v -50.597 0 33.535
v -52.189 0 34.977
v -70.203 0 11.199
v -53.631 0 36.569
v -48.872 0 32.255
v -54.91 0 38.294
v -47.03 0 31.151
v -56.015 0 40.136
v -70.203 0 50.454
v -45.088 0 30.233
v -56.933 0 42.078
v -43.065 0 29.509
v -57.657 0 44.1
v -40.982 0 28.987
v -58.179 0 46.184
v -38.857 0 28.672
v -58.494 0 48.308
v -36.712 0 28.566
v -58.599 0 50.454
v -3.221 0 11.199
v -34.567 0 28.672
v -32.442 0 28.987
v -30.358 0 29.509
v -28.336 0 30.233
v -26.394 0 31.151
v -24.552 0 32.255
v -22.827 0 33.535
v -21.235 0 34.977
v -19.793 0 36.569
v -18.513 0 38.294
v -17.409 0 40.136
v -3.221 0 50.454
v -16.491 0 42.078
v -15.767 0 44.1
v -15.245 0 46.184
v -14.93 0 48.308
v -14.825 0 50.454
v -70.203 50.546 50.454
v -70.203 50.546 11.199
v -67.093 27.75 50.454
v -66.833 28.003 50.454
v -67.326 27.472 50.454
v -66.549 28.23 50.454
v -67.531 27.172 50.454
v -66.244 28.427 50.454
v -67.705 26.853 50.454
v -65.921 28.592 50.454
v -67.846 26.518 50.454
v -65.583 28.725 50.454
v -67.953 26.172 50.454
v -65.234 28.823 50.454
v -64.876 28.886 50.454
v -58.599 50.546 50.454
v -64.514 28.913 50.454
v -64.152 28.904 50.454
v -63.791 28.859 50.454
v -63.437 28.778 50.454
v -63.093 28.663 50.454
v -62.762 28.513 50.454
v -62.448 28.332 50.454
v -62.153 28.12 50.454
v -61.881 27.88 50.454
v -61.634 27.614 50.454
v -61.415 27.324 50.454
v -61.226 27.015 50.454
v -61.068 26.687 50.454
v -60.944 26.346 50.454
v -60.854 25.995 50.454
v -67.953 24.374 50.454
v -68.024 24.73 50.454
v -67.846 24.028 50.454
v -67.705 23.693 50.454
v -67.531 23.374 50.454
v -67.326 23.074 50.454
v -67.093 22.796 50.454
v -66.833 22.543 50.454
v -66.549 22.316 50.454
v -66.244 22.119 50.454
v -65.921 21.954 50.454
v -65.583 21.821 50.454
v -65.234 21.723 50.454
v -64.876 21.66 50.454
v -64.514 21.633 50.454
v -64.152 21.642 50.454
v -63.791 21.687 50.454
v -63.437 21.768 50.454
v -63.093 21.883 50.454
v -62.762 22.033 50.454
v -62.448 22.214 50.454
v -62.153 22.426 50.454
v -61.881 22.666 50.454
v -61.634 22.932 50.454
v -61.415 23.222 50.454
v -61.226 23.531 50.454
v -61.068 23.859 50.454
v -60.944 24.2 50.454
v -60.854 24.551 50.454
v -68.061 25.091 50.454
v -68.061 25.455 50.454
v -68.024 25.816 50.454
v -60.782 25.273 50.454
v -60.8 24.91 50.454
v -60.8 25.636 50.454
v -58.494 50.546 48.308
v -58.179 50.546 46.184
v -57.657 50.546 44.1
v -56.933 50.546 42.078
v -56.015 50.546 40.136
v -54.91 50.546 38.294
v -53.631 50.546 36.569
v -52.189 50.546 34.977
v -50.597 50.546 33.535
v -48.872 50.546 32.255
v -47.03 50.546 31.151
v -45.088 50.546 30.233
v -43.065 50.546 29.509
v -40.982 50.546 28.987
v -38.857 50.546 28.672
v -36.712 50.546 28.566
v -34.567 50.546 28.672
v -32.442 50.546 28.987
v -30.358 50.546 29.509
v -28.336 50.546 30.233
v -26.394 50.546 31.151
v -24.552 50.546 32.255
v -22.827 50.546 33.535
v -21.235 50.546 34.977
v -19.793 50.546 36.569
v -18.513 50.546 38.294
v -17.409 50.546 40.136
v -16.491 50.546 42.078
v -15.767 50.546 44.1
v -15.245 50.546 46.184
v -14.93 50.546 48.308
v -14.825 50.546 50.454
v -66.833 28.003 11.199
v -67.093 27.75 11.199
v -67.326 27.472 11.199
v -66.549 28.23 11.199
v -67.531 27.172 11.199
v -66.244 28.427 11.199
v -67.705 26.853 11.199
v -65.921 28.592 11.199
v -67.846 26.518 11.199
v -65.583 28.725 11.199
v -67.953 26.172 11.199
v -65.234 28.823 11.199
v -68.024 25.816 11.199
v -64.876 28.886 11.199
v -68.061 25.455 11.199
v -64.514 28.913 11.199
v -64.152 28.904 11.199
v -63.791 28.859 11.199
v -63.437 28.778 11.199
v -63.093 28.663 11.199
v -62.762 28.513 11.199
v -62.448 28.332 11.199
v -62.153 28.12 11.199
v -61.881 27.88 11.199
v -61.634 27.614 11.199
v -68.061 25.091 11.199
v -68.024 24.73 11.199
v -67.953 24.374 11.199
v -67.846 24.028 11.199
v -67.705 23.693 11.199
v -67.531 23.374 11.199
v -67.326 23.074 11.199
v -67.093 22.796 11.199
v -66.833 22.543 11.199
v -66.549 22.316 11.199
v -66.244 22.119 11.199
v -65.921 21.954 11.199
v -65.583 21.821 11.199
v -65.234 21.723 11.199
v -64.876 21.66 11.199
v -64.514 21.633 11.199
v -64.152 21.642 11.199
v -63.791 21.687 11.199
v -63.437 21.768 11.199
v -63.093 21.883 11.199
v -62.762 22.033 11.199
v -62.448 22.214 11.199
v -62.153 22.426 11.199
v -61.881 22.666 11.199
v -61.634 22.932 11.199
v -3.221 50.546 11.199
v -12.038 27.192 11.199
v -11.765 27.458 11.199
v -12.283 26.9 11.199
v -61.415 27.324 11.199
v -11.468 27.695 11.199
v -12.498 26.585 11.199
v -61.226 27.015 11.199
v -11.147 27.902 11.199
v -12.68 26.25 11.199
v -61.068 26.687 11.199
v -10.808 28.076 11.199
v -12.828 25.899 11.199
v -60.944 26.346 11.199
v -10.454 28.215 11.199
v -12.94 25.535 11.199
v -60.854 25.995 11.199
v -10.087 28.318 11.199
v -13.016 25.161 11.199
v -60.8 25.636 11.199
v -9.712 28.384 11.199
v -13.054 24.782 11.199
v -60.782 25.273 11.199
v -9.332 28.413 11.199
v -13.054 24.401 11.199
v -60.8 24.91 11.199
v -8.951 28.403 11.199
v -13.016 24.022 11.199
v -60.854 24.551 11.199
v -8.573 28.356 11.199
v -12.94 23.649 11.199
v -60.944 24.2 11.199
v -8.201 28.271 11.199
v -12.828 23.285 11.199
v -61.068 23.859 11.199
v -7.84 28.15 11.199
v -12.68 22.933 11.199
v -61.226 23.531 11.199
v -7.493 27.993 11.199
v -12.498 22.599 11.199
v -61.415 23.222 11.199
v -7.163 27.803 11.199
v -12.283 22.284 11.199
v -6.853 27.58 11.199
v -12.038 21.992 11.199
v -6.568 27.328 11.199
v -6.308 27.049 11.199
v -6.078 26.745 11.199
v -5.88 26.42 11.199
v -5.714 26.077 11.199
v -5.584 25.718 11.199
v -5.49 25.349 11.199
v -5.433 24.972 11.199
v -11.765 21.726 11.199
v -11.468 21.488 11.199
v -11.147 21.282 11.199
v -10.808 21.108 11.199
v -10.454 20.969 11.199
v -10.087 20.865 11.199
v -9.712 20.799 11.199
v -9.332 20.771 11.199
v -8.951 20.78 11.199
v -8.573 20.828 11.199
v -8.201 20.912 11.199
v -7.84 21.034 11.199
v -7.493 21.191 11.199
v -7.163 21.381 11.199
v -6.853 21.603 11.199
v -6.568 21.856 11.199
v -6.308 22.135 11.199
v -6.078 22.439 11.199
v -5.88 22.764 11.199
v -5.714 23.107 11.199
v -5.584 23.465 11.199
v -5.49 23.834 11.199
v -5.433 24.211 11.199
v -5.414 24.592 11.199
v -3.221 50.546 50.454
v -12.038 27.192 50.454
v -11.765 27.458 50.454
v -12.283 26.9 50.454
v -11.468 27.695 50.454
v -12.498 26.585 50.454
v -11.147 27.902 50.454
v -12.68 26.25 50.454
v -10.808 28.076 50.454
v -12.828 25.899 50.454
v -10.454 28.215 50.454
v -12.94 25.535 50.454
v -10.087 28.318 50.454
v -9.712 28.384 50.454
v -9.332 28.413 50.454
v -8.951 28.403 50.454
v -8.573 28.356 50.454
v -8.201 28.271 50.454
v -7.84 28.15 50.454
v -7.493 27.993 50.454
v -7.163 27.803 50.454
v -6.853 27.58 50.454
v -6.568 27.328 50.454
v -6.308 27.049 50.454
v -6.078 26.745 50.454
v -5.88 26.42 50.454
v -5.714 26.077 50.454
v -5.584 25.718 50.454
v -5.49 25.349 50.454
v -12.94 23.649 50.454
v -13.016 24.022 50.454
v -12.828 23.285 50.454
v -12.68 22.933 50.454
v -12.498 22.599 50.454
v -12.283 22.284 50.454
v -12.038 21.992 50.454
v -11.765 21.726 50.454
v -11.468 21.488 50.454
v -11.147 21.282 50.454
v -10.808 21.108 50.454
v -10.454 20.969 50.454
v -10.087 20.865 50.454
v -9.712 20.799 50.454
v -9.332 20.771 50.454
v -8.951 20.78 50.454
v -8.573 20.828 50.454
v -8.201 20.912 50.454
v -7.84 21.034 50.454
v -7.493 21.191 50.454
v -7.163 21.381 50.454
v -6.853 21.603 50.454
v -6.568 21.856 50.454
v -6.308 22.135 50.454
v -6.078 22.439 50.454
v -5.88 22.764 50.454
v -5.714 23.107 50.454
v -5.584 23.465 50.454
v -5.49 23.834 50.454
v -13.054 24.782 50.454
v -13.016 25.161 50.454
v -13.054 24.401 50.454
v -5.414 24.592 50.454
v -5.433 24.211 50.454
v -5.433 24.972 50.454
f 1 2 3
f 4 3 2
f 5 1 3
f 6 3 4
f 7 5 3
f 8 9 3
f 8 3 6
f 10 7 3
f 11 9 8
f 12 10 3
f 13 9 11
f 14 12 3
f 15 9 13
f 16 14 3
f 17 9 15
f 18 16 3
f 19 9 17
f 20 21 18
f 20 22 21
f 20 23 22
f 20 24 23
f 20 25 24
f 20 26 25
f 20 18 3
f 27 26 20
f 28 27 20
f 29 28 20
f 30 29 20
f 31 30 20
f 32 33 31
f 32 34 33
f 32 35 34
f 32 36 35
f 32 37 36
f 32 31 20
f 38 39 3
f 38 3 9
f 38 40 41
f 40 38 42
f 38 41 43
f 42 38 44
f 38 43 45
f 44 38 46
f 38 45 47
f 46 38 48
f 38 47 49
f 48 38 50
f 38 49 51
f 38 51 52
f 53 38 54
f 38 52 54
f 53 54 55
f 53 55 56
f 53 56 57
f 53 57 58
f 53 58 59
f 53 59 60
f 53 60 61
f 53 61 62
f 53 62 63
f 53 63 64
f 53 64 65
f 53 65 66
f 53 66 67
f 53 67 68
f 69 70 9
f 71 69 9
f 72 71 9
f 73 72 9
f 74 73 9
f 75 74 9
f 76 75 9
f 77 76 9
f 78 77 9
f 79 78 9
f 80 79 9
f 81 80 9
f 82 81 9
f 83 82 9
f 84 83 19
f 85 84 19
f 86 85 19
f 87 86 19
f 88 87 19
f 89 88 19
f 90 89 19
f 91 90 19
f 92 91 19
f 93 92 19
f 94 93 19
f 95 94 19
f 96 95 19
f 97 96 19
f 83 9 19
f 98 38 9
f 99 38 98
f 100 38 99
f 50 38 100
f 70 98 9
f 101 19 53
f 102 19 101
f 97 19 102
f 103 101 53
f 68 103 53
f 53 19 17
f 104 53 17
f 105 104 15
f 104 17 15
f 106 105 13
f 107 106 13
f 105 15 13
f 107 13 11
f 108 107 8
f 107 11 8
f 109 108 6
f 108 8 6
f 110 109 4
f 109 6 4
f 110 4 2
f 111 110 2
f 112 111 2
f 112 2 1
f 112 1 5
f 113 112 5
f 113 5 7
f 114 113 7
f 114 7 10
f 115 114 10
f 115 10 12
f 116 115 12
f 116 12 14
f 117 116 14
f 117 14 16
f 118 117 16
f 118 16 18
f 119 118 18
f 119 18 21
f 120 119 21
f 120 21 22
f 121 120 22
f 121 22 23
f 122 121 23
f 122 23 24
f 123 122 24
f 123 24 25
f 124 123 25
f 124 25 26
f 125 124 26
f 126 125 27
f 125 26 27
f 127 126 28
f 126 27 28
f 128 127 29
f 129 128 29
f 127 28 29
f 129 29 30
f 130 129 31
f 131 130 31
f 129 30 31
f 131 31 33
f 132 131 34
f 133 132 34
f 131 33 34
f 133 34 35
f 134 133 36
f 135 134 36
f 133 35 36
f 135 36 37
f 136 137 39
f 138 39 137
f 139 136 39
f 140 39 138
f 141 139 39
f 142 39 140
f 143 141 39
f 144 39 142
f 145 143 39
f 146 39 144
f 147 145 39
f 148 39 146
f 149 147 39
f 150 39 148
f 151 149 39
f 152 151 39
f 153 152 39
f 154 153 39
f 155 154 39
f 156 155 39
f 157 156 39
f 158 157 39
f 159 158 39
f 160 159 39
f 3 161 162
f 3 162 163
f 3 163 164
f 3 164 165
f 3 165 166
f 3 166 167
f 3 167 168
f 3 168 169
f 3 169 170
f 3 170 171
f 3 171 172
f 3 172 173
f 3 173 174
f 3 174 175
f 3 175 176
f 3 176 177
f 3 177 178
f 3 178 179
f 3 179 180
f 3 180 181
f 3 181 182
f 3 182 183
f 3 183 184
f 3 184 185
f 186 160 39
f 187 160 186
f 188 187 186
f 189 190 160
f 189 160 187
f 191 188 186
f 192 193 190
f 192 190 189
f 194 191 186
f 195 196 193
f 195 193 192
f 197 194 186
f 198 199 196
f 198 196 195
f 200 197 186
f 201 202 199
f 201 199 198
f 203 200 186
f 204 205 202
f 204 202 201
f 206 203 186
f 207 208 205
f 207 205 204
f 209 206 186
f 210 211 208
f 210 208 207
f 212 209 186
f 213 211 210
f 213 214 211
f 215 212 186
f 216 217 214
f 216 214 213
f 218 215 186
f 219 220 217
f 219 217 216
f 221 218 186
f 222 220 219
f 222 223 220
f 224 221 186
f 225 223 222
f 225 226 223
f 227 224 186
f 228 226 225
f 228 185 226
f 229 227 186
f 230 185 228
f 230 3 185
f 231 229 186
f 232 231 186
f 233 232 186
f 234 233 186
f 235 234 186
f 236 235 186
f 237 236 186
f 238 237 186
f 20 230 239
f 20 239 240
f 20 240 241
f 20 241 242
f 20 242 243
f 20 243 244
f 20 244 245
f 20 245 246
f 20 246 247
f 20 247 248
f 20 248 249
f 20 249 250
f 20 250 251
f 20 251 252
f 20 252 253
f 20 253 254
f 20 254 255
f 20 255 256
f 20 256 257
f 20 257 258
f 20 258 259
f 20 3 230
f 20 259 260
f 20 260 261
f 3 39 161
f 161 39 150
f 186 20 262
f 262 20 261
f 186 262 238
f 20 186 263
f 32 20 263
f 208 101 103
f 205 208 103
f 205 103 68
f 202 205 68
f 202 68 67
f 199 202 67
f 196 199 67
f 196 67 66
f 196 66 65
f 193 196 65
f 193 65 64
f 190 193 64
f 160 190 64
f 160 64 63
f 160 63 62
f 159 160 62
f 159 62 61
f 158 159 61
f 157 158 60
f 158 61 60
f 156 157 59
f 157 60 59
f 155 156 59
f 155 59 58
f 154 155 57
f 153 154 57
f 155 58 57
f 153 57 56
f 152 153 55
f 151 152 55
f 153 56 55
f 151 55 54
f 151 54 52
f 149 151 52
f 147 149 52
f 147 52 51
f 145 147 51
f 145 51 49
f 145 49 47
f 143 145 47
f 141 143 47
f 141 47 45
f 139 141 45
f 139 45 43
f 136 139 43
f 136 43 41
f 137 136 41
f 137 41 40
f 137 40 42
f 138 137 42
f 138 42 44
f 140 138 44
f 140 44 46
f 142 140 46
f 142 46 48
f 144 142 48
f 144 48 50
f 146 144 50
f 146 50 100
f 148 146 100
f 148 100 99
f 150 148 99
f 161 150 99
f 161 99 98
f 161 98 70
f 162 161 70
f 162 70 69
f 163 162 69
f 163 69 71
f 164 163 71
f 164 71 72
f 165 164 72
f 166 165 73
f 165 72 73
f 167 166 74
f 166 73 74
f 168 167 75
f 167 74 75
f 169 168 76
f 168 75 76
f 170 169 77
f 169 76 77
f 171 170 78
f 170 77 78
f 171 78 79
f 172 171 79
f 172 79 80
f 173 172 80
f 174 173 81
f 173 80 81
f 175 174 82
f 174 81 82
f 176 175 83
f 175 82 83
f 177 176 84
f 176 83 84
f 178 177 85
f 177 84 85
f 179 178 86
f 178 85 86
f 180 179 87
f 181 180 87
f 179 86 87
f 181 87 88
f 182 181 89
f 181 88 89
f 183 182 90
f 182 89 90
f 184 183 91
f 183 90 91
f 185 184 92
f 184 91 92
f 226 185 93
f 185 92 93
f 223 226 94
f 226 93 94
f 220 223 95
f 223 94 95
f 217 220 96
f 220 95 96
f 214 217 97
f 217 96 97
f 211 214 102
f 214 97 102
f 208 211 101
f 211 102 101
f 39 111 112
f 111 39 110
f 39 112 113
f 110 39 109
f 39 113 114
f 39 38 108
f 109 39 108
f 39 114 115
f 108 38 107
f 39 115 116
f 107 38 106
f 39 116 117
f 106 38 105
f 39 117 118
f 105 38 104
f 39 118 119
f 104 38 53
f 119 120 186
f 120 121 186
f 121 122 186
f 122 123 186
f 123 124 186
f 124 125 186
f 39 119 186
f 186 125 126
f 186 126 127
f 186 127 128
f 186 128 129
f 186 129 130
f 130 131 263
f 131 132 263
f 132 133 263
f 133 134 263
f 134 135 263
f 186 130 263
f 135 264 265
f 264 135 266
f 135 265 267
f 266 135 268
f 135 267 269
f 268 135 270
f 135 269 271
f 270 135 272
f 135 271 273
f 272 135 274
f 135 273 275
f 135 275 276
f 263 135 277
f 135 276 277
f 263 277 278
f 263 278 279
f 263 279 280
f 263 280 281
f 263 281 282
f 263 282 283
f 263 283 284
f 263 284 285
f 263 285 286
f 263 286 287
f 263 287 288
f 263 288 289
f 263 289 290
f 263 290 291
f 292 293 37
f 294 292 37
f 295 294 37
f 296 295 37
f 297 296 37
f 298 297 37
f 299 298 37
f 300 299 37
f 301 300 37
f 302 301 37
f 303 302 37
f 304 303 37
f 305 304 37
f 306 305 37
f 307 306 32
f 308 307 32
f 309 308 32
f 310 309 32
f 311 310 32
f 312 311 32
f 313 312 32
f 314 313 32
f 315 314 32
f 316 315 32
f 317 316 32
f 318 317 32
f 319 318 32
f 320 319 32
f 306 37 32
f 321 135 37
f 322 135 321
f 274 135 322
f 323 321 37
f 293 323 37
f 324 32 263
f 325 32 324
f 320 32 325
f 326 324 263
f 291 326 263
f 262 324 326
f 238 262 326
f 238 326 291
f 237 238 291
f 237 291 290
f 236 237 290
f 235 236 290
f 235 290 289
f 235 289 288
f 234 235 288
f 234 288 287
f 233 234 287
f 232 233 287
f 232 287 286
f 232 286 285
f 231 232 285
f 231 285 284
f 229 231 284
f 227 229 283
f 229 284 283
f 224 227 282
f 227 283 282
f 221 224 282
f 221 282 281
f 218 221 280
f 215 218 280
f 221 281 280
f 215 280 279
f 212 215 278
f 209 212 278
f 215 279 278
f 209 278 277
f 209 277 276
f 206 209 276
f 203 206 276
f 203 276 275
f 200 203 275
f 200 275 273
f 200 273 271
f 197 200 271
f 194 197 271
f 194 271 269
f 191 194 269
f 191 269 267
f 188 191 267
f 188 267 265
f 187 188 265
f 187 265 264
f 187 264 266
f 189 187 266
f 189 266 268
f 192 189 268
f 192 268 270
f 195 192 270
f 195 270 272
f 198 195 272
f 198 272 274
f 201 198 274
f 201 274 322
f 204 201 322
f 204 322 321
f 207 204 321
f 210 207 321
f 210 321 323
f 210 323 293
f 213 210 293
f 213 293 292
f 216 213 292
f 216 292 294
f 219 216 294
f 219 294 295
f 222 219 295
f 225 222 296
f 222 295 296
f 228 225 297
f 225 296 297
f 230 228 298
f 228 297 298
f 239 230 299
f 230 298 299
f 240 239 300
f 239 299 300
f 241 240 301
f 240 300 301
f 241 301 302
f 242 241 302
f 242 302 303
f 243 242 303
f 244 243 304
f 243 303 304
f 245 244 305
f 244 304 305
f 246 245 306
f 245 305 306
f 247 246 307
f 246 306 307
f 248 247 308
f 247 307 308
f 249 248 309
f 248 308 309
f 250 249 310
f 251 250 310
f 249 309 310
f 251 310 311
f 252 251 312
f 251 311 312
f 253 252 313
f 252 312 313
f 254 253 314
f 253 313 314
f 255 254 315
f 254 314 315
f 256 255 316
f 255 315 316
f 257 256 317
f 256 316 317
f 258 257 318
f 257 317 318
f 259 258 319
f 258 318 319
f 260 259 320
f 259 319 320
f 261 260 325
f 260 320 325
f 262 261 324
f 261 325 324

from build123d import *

# Parameters (mm, degrees)
F0_W     = 66.982273
F0_H     = 39.254546
F1_DEPTH = 50.546
F3_DEPTH = 60.198
F4_R     = 3.641507
F4_R_2   = 3.822226
F5_DEPTH = 136.652


with BuildPart() as f1:
    # F0 (on Front) → F1 (new body)
    with BuildSketch(Plane.XZ):
        with Locations((-36.711974, 30.826364)):
            Rectangle(F0_W, F0_H)
    extrude(amount=-F1_DEPTH)

    # F2 (on face) → F3 (cut)
    with BuildSketch(Plane.XZ):
        with BuildLine():
            ThreePointArc((-58.599127, 50.453637), (-36.711974, 28.566484), (-14.824822, 50.453637))
            Line((-14.824822, 50.453637), (-58.599127, 50.453637))
        make_face()
        with BuildLine():
            Line((-58.599127, 50.453637), (-14.824822, 50.453637))
            ThreePointArc((-14.824822, 50.453637), (-36.711974, 72.34079), (-58.599127, 50.453637))
        make_face()
    extrude(amount=-F3_DEPTH, mode=Mode.SUBTRACT)

    # F4 (on face) → F5 (cut)
    with BuildSketch(Plane.XY.offset(50.453637)):
        with Locations((-64.423636, 25.273)):
            Circle(F4_R)
        with Locations((-9.236364, 24.591818)):
            Circle(F4_R_2)
    extrude(amount=-F5_DEPTH, mode=Mode.SUBTRACT)


solid = f1.part
